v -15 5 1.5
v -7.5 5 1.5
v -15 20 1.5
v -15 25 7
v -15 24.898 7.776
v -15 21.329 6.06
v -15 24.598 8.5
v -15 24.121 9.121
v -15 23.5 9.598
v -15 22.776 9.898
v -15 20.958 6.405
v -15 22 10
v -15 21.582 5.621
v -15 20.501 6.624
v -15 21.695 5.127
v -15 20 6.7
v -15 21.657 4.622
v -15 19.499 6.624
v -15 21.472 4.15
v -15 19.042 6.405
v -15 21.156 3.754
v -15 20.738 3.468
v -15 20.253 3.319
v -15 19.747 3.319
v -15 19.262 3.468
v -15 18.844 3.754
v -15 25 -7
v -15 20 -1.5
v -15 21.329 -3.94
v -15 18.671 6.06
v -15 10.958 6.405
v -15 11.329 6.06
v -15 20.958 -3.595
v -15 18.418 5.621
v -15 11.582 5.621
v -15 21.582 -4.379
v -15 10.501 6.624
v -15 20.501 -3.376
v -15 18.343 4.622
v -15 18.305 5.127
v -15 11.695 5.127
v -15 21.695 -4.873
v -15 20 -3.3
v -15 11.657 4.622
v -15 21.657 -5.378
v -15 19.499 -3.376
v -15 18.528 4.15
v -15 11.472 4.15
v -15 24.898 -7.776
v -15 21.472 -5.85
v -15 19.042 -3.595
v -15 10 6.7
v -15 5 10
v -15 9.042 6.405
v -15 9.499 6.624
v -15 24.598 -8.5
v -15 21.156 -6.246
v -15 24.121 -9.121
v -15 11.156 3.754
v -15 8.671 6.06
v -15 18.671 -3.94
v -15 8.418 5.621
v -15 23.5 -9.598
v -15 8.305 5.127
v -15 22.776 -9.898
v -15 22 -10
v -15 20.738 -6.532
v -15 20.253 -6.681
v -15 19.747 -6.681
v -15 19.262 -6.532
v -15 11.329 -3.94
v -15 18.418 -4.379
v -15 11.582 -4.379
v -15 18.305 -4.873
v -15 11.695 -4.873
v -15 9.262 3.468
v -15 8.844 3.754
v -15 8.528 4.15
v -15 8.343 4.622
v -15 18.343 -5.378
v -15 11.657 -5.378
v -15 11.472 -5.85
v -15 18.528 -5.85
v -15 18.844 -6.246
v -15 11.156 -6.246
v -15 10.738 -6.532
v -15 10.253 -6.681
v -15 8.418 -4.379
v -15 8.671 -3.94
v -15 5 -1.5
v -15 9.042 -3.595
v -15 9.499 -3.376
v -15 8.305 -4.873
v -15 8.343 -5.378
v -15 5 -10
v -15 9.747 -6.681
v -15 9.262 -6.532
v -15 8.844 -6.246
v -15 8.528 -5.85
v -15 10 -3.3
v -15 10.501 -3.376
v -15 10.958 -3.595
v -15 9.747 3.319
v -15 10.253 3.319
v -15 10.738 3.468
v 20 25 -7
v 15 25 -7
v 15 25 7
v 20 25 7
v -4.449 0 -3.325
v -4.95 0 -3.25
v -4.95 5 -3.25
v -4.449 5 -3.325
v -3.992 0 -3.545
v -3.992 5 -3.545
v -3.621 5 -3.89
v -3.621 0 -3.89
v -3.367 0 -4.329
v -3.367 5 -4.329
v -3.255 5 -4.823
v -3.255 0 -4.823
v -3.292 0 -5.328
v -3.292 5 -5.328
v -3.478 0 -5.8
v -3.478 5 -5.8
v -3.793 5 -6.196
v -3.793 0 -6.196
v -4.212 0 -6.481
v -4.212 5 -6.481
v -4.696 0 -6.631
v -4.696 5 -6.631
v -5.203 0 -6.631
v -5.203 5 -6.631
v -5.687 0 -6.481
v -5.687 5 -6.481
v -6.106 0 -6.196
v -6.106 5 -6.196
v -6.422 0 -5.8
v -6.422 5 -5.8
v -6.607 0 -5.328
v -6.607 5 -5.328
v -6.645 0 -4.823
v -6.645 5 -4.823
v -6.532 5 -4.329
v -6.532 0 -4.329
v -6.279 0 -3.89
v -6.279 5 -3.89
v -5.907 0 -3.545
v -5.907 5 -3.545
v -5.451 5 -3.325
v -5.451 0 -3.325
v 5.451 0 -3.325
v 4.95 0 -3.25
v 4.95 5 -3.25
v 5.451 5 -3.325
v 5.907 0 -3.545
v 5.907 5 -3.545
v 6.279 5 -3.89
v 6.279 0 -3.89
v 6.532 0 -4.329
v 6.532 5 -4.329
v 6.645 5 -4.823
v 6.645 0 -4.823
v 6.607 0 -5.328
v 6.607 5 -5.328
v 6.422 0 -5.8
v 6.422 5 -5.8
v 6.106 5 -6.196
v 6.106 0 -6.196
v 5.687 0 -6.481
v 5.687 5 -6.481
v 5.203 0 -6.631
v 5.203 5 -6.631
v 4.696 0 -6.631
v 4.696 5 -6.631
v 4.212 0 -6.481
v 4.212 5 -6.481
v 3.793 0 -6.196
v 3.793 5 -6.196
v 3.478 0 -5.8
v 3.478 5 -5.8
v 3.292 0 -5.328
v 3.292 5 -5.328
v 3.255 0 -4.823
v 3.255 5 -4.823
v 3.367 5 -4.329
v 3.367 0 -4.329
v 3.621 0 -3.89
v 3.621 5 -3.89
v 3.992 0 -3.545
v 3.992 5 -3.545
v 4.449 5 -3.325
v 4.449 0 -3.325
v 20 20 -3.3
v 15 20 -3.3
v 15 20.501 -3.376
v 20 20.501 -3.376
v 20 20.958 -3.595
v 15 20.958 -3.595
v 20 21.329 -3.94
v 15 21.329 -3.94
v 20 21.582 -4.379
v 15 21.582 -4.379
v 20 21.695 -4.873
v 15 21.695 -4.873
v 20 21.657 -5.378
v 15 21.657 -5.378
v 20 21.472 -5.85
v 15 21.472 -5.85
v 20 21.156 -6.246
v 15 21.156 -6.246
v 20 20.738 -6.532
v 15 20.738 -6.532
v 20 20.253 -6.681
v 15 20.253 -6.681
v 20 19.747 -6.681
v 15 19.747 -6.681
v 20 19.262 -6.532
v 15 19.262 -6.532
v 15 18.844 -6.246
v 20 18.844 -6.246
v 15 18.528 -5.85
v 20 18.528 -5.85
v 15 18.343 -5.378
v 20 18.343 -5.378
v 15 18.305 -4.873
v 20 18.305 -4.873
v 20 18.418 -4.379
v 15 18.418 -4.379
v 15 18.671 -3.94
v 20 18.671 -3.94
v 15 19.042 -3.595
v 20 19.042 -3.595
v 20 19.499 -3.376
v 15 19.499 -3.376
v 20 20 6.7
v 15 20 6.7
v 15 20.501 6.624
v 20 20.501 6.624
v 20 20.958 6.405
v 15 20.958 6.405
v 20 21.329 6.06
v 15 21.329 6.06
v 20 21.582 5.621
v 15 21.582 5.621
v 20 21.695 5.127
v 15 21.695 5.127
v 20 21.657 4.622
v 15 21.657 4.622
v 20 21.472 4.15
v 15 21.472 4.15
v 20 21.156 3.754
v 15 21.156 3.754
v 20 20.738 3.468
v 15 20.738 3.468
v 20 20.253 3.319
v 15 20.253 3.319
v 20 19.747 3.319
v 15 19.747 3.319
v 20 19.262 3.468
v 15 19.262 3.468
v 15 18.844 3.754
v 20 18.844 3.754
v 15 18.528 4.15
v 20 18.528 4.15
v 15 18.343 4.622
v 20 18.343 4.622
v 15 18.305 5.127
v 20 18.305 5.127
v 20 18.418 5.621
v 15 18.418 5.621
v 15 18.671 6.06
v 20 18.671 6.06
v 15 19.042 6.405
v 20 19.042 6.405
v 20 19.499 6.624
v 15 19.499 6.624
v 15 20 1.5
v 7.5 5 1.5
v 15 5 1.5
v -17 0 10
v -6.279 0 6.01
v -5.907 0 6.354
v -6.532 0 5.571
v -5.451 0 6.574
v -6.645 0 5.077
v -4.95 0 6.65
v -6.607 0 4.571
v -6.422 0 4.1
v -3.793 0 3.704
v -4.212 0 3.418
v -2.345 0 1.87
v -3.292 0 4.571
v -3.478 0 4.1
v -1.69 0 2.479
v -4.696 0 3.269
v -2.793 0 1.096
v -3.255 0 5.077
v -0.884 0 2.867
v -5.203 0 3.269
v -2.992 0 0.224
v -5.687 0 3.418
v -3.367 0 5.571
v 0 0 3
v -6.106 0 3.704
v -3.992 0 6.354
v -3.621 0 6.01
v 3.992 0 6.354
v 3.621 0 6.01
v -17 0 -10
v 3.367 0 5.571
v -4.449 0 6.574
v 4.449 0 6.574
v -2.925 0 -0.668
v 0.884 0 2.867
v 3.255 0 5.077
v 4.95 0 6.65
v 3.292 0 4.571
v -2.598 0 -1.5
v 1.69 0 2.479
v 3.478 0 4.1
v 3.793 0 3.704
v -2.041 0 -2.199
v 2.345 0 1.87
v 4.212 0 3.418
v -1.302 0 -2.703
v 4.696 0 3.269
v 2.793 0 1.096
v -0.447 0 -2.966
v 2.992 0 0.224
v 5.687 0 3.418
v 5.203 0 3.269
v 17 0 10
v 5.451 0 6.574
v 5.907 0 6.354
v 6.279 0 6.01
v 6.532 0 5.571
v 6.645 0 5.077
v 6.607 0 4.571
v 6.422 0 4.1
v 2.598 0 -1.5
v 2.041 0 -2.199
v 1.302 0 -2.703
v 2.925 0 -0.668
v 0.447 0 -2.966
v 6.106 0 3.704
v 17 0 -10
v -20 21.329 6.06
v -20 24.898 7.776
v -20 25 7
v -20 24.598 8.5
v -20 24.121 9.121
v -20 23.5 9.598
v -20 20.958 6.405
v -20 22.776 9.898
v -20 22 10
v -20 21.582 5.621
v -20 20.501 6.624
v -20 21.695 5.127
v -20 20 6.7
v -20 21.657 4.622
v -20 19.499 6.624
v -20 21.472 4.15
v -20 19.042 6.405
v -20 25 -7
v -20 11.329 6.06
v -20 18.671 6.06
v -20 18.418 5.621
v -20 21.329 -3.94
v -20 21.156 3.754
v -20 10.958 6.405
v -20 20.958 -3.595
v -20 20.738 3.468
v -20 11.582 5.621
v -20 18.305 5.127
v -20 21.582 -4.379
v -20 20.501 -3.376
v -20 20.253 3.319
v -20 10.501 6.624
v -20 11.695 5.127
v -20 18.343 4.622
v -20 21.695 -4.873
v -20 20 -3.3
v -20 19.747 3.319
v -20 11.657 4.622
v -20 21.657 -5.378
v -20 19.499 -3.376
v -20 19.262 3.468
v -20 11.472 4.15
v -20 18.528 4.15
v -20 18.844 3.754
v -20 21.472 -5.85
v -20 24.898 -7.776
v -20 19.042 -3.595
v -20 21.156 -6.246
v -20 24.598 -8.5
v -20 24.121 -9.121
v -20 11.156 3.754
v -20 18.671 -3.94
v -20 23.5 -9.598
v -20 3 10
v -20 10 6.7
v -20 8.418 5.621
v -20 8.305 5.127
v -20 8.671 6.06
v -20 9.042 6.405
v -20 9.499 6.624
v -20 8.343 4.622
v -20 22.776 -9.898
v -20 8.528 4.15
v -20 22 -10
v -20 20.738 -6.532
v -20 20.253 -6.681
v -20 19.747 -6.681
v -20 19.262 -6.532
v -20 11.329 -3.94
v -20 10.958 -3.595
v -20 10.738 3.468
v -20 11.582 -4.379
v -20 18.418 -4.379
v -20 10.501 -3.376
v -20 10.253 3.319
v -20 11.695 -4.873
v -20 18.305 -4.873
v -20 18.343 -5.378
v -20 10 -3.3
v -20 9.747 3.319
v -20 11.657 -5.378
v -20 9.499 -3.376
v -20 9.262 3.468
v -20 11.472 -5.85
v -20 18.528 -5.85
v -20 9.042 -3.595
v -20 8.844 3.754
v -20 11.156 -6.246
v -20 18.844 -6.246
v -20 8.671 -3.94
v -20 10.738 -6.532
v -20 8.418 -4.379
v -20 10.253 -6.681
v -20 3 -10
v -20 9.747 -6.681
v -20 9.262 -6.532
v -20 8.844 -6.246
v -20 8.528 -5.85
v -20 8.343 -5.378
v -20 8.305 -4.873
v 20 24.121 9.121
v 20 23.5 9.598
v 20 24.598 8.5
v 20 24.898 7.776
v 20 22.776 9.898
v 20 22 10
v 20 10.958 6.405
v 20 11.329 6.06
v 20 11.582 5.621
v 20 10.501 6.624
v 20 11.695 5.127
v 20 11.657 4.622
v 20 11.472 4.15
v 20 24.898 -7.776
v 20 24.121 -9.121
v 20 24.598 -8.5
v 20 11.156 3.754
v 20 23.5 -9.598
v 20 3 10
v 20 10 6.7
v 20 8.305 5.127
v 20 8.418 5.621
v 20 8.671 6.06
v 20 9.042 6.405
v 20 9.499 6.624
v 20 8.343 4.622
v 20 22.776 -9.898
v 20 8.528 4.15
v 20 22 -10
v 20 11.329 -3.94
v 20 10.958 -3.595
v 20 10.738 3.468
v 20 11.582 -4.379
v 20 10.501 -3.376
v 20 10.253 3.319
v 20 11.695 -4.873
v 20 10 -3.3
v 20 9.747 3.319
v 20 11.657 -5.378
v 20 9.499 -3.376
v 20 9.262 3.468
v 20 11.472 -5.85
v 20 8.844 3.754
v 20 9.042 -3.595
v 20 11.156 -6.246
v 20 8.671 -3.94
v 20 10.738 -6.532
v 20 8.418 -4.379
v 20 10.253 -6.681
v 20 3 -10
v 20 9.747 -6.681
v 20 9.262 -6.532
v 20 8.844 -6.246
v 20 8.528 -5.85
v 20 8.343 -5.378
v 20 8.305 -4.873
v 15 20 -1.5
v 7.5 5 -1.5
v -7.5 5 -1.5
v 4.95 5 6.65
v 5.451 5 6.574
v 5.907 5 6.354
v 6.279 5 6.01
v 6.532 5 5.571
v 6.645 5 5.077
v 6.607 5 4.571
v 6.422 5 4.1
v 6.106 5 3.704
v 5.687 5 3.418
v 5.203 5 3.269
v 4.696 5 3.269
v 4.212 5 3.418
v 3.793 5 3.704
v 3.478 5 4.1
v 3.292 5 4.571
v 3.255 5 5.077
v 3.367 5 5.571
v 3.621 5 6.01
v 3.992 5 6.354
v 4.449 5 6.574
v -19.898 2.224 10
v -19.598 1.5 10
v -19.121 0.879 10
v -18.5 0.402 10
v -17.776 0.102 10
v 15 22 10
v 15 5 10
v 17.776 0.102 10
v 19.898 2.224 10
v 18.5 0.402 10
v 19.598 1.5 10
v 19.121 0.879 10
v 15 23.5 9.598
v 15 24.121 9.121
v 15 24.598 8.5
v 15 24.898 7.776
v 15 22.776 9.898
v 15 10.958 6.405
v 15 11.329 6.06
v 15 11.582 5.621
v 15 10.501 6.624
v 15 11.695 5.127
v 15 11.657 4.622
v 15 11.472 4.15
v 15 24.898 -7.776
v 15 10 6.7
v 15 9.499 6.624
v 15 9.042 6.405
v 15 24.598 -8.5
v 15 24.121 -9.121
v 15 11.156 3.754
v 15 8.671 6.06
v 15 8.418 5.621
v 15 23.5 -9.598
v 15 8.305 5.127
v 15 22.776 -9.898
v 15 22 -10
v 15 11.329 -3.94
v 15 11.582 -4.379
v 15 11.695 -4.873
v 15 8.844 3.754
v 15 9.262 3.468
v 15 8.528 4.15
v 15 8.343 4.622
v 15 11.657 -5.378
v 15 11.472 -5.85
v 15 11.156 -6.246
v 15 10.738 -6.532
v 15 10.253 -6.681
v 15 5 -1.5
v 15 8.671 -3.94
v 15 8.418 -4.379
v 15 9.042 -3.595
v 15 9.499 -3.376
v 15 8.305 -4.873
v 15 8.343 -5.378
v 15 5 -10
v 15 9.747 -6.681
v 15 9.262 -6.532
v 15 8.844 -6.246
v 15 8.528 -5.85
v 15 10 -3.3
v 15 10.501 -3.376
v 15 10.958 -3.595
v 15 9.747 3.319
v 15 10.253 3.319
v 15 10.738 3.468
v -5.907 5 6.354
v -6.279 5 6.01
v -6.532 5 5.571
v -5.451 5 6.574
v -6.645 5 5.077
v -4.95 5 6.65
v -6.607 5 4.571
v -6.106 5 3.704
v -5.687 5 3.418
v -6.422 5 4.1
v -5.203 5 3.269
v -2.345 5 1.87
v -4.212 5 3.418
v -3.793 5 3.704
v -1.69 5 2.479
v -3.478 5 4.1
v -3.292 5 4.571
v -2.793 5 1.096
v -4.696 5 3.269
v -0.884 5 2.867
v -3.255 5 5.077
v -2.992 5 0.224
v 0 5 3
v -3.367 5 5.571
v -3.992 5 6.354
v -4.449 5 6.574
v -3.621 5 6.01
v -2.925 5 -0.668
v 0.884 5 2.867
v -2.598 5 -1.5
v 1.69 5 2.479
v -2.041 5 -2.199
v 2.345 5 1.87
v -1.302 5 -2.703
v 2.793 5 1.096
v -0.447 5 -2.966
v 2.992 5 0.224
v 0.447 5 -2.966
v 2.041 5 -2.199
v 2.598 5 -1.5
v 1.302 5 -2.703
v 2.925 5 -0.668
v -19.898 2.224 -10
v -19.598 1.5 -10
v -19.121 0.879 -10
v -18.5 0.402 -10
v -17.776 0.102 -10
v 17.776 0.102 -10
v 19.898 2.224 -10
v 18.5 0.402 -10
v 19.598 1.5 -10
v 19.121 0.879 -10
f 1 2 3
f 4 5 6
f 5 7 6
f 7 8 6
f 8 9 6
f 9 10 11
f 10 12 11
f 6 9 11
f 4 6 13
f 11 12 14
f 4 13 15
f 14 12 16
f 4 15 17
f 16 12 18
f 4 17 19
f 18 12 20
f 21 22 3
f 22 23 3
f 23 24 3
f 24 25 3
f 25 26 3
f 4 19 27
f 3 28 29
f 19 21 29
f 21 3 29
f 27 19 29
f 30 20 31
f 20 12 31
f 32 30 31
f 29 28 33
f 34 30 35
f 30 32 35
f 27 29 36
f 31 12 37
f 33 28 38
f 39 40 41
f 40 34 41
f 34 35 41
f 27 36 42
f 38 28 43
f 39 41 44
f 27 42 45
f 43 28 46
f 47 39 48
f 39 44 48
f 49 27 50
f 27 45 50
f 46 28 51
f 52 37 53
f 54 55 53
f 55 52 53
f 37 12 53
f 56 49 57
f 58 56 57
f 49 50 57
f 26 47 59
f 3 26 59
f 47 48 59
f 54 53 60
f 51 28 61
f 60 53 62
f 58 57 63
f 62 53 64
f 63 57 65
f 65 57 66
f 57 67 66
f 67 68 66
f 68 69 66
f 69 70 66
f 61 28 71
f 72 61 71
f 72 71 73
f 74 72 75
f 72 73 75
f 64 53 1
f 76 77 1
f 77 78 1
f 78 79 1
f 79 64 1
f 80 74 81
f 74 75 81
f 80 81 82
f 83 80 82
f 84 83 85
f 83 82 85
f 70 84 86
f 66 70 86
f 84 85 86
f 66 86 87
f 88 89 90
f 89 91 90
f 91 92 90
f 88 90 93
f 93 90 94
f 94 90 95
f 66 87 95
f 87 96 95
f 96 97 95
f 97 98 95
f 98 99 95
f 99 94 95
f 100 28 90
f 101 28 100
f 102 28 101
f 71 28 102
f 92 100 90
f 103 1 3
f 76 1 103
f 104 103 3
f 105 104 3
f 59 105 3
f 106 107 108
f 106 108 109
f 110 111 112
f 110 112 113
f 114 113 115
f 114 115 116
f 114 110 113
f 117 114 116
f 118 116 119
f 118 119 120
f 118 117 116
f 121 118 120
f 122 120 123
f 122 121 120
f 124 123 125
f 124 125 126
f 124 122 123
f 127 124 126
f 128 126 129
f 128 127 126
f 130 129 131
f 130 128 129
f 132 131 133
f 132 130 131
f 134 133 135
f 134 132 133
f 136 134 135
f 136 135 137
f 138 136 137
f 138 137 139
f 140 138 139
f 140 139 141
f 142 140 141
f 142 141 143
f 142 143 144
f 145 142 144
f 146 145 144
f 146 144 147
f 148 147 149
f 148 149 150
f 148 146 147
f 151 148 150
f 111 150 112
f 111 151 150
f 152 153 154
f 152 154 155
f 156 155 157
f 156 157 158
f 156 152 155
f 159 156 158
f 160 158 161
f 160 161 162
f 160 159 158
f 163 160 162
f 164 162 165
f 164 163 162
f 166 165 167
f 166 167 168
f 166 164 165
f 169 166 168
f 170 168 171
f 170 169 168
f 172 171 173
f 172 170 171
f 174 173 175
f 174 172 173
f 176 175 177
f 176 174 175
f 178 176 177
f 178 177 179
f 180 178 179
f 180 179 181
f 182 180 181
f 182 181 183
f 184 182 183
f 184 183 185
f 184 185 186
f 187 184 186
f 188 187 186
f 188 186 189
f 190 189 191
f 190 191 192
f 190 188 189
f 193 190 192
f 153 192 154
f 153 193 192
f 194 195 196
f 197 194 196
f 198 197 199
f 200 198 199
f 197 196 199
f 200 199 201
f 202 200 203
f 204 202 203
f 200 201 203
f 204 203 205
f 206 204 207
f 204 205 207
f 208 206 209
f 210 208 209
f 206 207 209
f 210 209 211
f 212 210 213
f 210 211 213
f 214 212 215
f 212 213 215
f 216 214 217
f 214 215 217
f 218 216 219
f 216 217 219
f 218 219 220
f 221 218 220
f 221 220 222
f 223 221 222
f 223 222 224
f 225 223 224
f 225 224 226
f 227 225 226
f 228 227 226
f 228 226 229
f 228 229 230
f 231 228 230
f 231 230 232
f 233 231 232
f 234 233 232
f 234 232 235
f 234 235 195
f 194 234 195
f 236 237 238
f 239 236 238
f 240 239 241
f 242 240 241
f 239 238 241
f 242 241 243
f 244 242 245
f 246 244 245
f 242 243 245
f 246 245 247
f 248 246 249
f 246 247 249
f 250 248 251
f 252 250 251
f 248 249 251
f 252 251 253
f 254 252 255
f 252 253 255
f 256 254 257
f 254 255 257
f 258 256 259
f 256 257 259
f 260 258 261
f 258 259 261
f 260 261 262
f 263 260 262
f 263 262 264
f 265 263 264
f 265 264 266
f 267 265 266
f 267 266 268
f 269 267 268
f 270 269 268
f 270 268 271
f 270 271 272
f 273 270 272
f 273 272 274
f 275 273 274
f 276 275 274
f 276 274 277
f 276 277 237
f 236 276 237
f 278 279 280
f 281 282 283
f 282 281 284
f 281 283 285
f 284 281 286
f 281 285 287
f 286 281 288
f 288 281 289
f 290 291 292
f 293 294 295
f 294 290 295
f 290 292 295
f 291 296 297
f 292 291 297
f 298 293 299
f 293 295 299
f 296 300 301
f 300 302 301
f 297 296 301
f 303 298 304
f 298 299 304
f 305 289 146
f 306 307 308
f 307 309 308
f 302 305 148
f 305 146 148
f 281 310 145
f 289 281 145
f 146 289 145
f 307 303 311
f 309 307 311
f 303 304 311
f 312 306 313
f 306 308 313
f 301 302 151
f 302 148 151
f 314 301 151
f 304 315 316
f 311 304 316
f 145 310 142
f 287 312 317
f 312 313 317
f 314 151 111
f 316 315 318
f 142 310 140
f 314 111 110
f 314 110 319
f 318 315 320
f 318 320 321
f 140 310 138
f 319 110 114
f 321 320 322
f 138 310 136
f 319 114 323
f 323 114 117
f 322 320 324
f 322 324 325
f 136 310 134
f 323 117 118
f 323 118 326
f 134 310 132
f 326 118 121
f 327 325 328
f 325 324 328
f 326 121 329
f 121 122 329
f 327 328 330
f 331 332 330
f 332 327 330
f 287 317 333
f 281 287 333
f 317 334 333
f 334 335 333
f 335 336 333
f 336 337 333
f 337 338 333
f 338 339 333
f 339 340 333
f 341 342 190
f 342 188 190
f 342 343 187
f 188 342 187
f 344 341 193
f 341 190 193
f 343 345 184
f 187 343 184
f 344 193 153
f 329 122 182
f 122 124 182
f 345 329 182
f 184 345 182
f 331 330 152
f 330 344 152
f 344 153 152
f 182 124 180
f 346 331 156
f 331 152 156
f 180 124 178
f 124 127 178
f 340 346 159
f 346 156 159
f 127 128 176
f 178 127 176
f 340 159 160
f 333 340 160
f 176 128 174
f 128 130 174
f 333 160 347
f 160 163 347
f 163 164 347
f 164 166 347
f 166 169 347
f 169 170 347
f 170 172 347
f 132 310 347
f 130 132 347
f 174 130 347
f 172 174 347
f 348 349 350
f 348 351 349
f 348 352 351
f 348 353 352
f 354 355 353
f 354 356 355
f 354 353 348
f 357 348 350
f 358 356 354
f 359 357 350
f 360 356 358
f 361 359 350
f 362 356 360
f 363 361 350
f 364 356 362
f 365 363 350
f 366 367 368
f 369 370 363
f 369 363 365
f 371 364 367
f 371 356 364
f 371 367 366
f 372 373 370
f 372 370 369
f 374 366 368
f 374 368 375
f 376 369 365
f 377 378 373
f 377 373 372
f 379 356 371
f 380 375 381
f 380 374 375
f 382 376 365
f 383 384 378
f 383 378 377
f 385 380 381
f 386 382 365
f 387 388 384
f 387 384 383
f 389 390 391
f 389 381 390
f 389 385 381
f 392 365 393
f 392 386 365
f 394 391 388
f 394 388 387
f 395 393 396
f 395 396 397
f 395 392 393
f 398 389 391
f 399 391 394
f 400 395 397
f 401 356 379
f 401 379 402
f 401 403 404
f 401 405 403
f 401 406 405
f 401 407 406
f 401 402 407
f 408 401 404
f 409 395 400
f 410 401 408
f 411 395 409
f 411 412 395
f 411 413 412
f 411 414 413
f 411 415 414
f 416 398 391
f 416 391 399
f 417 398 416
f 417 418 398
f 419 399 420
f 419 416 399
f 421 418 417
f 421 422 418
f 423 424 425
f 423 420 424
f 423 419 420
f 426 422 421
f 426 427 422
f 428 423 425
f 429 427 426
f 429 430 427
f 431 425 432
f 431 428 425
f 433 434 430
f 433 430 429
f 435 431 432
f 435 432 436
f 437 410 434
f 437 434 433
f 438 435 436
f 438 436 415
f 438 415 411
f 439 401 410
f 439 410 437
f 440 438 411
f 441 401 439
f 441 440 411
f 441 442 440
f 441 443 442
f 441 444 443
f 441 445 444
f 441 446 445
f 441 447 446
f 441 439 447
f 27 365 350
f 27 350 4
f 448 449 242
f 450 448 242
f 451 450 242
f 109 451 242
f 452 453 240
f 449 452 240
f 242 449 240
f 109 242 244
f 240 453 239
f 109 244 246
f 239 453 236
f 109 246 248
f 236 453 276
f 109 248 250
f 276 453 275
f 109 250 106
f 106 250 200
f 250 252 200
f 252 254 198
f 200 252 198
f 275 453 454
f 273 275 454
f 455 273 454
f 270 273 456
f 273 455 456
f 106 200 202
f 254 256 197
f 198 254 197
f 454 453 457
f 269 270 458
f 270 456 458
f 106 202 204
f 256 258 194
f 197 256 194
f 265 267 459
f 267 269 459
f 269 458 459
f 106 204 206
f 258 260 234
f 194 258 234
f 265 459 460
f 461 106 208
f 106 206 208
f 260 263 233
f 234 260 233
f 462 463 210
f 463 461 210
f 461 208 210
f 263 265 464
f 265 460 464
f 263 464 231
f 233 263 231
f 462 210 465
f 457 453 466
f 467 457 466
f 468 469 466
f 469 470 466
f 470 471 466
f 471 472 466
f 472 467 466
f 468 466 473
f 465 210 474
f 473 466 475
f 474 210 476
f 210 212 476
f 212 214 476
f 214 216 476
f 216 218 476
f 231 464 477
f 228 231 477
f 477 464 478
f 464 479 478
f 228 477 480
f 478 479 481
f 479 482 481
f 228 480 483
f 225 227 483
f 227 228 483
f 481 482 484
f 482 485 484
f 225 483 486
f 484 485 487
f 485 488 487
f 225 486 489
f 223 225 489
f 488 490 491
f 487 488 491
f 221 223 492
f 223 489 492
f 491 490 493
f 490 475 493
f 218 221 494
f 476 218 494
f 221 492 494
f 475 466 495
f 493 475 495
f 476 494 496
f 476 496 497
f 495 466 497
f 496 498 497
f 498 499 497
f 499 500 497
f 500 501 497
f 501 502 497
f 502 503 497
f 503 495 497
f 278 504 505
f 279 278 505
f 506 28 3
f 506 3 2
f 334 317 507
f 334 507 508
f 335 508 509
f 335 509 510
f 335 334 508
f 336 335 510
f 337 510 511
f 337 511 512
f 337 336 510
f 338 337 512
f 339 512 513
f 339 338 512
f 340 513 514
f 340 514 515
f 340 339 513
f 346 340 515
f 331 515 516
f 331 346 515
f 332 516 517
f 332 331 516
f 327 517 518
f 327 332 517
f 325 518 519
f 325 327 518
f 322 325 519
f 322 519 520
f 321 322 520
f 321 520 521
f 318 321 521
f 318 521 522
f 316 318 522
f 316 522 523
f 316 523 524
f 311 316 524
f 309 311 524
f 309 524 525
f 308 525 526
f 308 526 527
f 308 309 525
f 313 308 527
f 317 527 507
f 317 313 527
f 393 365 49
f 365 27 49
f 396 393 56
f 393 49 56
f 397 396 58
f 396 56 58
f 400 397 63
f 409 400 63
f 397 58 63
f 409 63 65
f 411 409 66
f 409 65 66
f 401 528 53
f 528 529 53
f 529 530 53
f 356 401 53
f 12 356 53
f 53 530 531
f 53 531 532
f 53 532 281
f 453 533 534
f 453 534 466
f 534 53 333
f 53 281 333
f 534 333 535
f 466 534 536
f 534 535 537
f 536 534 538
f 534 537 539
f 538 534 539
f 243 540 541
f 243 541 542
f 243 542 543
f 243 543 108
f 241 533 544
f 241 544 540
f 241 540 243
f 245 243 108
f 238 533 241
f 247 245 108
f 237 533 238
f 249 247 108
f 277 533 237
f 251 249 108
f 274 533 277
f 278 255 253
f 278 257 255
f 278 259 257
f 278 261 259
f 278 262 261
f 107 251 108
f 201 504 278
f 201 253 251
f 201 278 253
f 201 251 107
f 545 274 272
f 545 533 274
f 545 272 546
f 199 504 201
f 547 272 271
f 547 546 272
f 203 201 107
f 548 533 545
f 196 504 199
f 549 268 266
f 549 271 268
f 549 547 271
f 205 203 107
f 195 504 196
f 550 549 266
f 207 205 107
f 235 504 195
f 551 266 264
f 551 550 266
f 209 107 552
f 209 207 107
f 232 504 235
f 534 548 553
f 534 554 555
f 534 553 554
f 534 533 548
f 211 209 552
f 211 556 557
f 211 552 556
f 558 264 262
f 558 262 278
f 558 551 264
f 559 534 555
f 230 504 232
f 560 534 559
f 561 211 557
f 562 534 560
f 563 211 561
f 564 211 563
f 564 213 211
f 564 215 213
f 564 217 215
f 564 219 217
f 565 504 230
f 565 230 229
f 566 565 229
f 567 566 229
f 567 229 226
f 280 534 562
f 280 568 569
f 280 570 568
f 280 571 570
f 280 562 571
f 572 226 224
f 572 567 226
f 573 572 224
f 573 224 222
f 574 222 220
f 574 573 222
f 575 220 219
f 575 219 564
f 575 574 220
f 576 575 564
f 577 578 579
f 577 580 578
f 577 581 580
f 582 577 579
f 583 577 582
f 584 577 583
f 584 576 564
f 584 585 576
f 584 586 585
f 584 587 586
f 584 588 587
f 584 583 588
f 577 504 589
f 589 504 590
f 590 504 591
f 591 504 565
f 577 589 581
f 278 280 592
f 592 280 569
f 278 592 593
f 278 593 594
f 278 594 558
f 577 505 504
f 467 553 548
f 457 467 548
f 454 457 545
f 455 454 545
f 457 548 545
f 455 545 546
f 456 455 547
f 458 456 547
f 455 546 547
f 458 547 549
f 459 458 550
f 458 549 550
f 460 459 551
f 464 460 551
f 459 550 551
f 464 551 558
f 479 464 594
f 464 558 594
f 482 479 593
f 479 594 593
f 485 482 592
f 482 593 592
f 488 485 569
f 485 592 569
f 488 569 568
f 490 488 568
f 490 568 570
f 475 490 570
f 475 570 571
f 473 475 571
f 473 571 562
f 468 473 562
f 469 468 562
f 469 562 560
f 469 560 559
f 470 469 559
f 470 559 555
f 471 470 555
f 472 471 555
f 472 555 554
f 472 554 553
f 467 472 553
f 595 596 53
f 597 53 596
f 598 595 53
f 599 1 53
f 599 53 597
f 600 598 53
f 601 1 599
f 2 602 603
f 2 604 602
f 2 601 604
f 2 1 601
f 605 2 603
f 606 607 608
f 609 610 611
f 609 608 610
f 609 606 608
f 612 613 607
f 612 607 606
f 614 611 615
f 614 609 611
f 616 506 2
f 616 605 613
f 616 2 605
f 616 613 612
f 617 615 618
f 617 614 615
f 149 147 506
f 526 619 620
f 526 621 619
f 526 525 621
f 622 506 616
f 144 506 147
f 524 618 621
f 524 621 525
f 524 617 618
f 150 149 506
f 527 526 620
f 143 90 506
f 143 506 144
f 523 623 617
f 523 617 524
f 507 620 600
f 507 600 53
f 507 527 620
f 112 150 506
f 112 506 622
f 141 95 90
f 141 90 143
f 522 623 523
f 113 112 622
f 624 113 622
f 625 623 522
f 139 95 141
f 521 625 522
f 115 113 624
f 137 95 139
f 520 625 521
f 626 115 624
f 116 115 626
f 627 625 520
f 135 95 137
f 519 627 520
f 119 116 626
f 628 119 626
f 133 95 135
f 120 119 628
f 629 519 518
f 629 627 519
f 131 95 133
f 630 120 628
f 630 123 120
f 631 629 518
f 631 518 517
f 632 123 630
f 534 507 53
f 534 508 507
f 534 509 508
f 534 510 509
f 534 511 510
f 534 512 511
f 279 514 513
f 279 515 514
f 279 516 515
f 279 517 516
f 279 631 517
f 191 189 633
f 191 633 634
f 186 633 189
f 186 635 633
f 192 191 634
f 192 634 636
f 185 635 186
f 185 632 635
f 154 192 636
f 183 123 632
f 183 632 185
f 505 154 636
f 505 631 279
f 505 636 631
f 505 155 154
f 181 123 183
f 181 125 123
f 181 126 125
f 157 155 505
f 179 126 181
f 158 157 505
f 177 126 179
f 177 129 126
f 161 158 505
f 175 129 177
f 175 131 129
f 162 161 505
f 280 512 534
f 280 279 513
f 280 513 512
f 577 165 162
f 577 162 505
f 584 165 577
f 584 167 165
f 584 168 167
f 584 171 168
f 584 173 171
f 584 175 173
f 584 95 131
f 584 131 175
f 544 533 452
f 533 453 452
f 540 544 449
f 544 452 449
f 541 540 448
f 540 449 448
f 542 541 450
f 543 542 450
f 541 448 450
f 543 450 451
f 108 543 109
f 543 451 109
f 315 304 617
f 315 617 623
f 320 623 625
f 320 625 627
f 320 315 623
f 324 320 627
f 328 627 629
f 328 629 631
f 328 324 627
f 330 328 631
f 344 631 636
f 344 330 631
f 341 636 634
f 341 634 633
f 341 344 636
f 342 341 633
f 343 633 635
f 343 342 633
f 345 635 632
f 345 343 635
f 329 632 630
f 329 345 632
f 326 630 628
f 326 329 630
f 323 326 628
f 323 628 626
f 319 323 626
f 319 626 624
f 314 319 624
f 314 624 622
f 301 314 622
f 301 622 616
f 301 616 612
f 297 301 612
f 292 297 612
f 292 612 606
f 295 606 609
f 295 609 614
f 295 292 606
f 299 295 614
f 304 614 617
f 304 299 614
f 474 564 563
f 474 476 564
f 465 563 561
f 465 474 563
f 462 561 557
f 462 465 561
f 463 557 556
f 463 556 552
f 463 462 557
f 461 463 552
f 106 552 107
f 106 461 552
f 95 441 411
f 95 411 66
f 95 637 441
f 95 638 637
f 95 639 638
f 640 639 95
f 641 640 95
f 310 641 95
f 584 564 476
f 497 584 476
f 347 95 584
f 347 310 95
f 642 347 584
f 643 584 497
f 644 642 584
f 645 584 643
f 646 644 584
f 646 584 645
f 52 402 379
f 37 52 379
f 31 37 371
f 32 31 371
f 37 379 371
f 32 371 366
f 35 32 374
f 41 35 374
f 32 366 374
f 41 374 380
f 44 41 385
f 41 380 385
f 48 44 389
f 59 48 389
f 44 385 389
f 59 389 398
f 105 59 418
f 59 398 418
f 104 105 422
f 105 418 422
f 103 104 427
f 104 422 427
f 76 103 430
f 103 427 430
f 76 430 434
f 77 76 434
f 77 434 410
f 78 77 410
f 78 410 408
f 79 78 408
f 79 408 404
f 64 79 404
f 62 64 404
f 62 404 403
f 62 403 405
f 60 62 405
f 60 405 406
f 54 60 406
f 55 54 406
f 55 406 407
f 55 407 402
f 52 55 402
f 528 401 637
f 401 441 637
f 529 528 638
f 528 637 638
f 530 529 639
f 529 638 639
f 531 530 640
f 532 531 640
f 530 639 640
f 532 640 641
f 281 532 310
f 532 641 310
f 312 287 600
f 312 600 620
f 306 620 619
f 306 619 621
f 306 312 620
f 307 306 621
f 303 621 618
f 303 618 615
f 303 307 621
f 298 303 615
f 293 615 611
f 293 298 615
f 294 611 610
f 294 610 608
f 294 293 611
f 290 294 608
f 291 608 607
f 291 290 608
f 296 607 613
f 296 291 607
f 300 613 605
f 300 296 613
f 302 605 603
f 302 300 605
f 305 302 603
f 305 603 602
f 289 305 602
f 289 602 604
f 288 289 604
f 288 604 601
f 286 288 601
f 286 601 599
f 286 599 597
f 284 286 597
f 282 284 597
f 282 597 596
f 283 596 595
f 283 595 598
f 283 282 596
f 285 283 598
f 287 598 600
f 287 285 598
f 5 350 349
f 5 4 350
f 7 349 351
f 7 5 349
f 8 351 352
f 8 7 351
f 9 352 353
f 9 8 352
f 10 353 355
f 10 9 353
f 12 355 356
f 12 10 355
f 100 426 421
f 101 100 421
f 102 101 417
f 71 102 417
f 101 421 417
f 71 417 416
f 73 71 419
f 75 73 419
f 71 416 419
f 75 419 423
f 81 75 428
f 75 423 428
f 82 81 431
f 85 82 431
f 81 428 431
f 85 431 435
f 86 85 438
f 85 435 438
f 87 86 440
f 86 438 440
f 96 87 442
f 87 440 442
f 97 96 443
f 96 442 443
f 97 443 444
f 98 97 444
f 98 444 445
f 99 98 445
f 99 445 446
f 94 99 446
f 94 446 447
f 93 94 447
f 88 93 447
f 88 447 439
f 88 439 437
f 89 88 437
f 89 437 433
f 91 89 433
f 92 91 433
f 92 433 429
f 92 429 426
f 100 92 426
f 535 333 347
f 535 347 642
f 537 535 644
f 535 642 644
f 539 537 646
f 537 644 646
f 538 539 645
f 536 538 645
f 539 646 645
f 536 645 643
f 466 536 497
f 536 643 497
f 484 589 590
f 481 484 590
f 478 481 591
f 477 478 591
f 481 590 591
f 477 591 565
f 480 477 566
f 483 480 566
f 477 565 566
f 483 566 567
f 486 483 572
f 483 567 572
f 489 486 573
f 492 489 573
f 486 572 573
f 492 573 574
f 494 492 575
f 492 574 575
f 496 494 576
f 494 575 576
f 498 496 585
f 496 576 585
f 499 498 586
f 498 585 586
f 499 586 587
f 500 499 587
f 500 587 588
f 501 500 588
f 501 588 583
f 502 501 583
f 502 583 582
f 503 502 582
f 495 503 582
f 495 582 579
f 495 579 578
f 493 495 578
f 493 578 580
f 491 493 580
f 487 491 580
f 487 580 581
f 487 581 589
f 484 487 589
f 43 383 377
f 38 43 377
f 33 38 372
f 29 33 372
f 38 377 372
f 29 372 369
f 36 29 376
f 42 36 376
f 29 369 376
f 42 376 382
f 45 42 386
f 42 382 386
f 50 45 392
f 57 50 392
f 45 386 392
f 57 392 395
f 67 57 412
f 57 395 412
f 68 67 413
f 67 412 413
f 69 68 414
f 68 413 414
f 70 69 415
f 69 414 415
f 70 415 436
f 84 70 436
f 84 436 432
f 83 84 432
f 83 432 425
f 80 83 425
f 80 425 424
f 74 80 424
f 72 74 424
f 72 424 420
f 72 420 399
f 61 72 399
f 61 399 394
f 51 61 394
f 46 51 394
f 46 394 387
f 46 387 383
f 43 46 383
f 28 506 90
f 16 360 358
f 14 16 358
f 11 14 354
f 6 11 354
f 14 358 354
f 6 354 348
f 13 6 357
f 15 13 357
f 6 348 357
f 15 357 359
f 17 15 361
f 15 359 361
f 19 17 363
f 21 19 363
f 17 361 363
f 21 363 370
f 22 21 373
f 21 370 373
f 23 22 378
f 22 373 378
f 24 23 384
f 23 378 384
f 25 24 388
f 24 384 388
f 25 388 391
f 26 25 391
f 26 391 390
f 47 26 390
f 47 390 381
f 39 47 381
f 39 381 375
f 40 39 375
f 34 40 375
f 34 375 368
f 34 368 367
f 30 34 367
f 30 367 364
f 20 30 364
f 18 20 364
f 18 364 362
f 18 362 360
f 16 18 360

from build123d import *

# Parameters (mm, degrees)
SKETCH_1_W           = 40
SKETCH_1_H           = 20
SKETCH_1_R           = 1.7
SKETCH_1_R_2         = 3
EXTRUDE_1_DEPTH      = 5
SKETCH_2_W           = 5
SKETCH_2_H           = 20
EXTRUDE_2_DEPTH      = 20
EXTRUDE_3_DEPTH      = 1.5
EXTRUDE_3_DEPTH_BACK = 1.5
SKETCH_4_R           = 1.7
CUT_EXTRUDE_1_DEPTH  = 49.218253805
FILLET_1_R           = 3


with BuildPart() as part:
    # 草图1 → 凸台-拉伸1 (new body)
    with BuildSketch(Plane(origin=(0, 0, 0), x_dir=(1, 0, 0), z_dir=(0, 1, 0))):
        Rectangle(SKETCH_1_W, SKETCH_1_H)
        with Locations(Location((4.949747468, 4.949747468, 0), (0, 0, 270))):
            Circle(SKETCH_1_R, mode=Mode.SUBTRACT)
        with Locations(Location((4.949747468, -4.949747468, 0), (0, 0, 270))):
            Circle(SKETCH_1_R, mode=Mode.SUBTRACT)
        with Locations(Location((-4.949747468, -4.949747468, 0), (0, 0, 270))):
            Circle(SKETCH_1_R, mode=Mode.SUBTRACT)
        with Locations(Location((-4.949747468, 4.949747468, 0), (0, 0, 270))):
            Circle(SKETCH_1_R, mode=Mode.SUBTRACT)
        with Locations(Location((0, 0, 0), (0, 0, 270))):
            Circle(SKETCH_1_R_2, mode=Mode.SUBTRACT)
    extrude(amount=EXTRUDE_1_DEPTH)

    # 草图2 → 凸台-拉伸2 (add)
    with BuildSketch(Plane(origin=(0, 5, 0), x_dir=(1, 0, 0), z_dir=(0, 1, 0))):
        with Locations((-17.5, 0)):
            Rectangle(SKETCH_2_W, SKETCH_2_H)
        with Locations((17.5, 0)):
            Rectangle(SKETCH_2_W, SKETCH_2_H)
    extrude(amount=EXTRUDE_2_DEPTH)

    # 草图3 → 凸台-拉伸3 (add, two sides: drawn at the far end of the back side and taken through both)
    with BuildSketch(Plane.XY.offset(-EXTRUDE_3_DEPTH_BACK)):
        Polygon((-15, 20), (-7.5, 5), (-15, 5), align=None)
        Polygon((15, 5), (15, 20), (7.5, 5), align=None)
    extrude(amount=EXTRUDE_3_DEPTH + EXTRUDE_3_DEPTH_BACK)

    # 草图4 → 切除-拉伸1 (cut, through all)
    with BuildSketch(Plane.ZY.offset(20)):
        with Locations((-5, 20)):
            Circle(SKETCH_4_R)
        with Locations((5, 20)):
            Circle(SKETCH_4_R)
        with Locations((5, 10)):
            Circle(SKETCH_4_R)
        with Locations((-5, 10)):
            Circle(SKETCH_4_R)
    extrude(amount=-CUT_EXTRUDE_1_DEPTH, mode=Mode.SUBTRACT)

    # 圆角1
    fillet_1_edges = [part.edges().sort_by_distance(p)[0] for p in [
        (-17.5, 25, 10),
        (-17.5, 25, -10),
        (17.5, 25, -10),
        (17.5, 25, 10),
        (-20, 0, 0),
        (20, 0, 0),
    ]]
    fillet(fillet_1_edges, radius=FILLET_1_R)


solid = part.part
